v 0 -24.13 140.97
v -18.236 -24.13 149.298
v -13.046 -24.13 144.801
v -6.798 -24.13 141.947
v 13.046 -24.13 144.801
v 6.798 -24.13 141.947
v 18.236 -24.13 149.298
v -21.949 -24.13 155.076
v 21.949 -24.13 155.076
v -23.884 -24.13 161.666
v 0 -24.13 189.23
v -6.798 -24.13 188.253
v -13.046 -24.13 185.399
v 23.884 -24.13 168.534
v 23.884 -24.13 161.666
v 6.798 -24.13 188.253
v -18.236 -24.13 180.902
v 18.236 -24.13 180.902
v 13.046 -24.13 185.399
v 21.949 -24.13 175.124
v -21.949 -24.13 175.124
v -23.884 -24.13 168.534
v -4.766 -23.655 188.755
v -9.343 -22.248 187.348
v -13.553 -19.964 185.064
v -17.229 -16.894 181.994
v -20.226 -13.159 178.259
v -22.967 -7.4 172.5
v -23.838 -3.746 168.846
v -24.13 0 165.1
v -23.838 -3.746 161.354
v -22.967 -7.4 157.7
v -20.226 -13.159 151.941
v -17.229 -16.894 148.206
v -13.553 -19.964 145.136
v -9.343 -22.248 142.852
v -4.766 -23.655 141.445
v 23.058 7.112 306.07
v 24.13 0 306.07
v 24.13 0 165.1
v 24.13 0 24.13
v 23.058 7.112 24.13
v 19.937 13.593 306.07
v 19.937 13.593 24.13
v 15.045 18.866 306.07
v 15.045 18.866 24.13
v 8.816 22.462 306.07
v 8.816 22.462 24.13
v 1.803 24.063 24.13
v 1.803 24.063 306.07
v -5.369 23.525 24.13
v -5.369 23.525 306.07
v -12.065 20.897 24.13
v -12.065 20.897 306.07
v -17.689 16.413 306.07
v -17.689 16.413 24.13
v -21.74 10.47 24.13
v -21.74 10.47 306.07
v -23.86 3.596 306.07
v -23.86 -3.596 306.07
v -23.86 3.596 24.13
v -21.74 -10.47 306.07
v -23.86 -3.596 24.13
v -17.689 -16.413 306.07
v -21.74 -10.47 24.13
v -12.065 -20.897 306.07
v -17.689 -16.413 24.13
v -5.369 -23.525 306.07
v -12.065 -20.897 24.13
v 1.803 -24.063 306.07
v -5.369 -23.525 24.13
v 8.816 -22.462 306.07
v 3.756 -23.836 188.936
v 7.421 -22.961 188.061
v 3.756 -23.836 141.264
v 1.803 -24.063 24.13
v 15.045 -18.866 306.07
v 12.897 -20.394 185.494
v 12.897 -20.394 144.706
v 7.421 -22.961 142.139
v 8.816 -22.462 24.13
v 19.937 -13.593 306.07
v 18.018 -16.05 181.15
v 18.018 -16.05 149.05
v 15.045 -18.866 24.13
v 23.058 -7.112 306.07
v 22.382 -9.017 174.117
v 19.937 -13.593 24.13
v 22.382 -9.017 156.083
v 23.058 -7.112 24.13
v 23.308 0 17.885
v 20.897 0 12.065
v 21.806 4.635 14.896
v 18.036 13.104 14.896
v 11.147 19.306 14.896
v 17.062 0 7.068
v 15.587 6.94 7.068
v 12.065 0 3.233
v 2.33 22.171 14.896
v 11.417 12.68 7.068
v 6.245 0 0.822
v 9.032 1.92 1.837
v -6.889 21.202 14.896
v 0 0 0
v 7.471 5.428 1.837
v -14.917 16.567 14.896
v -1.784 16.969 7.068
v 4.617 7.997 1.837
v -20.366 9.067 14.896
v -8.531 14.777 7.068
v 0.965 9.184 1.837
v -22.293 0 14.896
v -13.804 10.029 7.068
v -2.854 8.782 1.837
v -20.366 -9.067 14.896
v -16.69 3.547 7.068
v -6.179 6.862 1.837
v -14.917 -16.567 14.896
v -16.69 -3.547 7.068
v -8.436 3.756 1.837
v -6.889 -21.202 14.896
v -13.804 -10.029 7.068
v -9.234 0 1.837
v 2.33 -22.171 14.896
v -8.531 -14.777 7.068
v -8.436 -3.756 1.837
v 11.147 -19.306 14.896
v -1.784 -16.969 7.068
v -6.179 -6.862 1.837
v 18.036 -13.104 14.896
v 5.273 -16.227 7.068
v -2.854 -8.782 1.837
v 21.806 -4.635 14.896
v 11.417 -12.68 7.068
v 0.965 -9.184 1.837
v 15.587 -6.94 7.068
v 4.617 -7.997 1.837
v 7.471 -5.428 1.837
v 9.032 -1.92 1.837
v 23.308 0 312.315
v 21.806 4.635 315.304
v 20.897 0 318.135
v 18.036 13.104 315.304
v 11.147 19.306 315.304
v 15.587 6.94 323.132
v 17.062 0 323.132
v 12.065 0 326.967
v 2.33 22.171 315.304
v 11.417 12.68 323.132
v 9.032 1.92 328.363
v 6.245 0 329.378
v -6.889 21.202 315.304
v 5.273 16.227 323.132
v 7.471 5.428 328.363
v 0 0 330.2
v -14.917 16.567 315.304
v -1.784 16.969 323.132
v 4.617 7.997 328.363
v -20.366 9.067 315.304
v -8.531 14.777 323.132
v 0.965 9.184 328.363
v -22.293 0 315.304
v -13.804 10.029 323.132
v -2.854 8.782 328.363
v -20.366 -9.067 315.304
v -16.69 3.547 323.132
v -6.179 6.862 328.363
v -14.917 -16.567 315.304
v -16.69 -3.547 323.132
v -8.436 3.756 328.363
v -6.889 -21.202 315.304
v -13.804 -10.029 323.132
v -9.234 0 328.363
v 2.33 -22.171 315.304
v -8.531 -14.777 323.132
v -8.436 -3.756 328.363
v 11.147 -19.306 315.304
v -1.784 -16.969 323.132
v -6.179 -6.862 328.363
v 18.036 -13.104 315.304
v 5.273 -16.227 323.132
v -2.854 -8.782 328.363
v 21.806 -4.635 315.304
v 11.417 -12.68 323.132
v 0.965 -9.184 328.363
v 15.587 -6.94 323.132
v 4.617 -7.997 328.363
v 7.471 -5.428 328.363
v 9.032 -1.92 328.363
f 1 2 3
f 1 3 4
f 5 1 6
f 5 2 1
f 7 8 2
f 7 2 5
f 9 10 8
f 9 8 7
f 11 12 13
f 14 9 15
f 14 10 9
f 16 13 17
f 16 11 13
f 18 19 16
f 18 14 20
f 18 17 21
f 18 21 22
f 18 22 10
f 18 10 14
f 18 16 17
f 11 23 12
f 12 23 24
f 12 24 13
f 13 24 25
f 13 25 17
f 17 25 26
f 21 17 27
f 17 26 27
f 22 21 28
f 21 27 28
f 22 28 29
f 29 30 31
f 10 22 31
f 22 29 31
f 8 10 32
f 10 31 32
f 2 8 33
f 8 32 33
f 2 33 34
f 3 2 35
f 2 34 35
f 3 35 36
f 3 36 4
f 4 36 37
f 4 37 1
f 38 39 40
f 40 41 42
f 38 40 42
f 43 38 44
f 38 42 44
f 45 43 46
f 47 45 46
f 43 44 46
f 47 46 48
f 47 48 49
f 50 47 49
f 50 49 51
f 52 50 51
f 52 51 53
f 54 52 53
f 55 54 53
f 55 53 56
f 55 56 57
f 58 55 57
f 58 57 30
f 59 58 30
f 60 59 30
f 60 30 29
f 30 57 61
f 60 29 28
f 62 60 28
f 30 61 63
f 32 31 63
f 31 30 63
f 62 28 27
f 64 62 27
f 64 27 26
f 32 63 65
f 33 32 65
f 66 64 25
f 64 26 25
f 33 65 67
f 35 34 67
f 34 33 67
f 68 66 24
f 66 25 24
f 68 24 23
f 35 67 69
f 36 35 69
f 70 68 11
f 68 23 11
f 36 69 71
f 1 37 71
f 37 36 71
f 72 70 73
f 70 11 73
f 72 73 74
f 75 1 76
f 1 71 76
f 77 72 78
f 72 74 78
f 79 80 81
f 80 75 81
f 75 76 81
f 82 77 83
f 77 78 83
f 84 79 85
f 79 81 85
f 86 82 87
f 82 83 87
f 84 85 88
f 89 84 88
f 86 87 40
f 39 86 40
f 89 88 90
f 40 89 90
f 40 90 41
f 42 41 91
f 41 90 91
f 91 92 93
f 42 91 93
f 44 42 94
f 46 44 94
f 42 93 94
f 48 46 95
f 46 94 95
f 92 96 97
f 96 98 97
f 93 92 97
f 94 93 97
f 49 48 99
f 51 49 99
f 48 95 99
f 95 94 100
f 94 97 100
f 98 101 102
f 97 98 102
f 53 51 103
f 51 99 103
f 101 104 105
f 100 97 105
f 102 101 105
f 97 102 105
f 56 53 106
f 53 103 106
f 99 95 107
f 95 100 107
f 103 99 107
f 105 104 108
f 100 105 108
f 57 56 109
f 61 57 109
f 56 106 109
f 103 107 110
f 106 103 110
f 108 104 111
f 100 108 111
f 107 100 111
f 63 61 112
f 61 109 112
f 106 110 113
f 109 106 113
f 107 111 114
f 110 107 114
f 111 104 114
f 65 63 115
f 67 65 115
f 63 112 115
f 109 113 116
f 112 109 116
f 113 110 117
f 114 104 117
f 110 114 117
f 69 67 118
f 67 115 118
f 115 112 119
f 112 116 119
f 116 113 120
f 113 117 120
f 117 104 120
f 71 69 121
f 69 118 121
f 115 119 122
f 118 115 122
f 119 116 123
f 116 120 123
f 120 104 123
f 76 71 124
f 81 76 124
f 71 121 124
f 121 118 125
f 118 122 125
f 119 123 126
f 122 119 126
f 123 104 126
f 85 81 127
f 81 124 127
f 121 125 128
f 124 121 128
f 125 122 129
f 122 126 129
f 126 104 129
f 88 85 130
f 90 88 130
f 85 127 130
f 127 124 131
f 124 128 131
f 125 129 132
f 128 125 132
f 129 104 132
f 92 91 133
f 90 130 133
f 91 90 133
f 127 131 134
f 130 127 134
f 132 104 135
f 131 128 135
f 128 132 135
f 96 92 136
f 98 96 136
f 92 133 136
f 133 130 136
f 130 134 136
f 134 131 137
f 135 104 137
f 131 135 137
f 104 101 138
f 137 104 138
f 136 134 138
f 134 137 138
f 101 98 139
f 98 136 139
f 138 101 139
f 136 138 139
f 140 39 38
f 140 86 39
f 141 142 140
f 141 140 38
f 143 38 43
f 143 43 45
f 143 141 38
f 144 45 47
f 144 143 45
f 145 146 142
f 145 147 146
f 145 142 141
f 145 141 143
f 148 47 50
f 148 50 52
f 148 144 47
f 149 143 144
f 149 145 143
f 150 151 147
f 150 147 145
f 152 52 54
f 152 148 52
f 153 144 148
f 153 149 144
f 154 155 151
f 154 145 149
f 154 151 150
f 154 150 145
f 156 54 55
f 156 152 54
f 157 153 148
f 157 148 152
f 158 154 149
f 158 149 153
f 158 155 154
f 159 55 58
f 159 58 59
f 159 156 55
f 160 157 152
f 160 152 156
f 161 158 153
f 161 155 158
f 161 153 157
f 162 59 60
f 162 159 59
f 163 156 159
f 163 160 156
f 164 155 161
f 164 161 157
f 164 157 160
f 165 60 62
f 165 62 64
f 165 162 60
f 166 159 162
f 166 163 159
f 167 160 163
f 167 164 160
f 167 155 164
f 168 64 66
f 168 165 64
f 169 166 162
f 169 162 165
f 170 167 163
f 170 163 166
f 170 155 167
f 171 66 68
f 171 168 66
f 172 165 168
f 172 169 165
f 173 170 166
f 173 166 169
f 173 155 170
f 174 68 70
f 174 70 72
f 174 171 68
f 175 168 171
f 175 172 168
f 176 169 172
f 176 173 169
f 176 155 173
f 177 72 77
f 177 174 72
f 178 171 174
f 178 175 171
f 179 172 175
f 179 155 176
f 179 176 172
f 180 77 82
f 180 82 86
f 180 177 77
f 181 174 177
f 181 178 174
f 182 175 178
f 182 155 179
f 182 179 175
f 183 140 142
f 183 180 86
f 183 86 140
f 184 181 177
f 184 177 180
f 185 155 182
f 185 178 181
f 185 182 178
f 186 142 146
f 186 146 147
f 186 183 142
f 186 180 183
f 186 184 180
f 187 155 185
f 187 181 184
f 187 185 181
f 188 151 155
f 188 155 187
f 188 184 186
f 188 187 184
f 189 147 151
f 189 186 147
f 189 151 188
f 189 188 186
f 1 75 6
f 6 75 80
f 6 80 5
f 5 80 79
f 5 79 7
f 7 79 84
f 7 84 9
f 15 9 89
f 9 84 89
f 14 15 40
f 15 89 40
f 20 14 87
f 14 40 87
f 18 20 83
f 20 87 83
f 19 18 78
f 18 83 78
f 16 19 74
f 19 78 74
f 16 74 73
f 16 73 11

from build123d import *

# Parameters (mm, degrees)
F0_R     = 24.13
F1_DEPTH = 330.2
F2_R     = 24.13
F3_R     = 24.13
F4_R     = 24.13
F5_DEPTH = 24.13


with BuildPart() as f1:
    # F0 (on Top) → F1 (new body)
    with BuildSketch(Plane.XY):
        Circle(F0_R)
    extrude(amount=F1_DEPTH)

    # F2
    f2_edges = [f1.edges().sort_by_distance(p)[0] for p in [
        (-24.13, 0, 330.2),
    ]]
    fillet(f2_edges, radius=F2_R)

    # F3
    f3_edges = [f1.edges().sort_by_distance(p)[0] for p in [
        (-24.13, 0, 0),
    ]]
    fillet(f3_edges, radius=F3_R)

    # F4 (on Front) → F5 (join)
    with BuildSketch(Plane.XZ):
        with Locations((0, 165.1)):
            Circle(F4_R)
    extrude(amount=F5_DEPTH)


solid = f1.part
